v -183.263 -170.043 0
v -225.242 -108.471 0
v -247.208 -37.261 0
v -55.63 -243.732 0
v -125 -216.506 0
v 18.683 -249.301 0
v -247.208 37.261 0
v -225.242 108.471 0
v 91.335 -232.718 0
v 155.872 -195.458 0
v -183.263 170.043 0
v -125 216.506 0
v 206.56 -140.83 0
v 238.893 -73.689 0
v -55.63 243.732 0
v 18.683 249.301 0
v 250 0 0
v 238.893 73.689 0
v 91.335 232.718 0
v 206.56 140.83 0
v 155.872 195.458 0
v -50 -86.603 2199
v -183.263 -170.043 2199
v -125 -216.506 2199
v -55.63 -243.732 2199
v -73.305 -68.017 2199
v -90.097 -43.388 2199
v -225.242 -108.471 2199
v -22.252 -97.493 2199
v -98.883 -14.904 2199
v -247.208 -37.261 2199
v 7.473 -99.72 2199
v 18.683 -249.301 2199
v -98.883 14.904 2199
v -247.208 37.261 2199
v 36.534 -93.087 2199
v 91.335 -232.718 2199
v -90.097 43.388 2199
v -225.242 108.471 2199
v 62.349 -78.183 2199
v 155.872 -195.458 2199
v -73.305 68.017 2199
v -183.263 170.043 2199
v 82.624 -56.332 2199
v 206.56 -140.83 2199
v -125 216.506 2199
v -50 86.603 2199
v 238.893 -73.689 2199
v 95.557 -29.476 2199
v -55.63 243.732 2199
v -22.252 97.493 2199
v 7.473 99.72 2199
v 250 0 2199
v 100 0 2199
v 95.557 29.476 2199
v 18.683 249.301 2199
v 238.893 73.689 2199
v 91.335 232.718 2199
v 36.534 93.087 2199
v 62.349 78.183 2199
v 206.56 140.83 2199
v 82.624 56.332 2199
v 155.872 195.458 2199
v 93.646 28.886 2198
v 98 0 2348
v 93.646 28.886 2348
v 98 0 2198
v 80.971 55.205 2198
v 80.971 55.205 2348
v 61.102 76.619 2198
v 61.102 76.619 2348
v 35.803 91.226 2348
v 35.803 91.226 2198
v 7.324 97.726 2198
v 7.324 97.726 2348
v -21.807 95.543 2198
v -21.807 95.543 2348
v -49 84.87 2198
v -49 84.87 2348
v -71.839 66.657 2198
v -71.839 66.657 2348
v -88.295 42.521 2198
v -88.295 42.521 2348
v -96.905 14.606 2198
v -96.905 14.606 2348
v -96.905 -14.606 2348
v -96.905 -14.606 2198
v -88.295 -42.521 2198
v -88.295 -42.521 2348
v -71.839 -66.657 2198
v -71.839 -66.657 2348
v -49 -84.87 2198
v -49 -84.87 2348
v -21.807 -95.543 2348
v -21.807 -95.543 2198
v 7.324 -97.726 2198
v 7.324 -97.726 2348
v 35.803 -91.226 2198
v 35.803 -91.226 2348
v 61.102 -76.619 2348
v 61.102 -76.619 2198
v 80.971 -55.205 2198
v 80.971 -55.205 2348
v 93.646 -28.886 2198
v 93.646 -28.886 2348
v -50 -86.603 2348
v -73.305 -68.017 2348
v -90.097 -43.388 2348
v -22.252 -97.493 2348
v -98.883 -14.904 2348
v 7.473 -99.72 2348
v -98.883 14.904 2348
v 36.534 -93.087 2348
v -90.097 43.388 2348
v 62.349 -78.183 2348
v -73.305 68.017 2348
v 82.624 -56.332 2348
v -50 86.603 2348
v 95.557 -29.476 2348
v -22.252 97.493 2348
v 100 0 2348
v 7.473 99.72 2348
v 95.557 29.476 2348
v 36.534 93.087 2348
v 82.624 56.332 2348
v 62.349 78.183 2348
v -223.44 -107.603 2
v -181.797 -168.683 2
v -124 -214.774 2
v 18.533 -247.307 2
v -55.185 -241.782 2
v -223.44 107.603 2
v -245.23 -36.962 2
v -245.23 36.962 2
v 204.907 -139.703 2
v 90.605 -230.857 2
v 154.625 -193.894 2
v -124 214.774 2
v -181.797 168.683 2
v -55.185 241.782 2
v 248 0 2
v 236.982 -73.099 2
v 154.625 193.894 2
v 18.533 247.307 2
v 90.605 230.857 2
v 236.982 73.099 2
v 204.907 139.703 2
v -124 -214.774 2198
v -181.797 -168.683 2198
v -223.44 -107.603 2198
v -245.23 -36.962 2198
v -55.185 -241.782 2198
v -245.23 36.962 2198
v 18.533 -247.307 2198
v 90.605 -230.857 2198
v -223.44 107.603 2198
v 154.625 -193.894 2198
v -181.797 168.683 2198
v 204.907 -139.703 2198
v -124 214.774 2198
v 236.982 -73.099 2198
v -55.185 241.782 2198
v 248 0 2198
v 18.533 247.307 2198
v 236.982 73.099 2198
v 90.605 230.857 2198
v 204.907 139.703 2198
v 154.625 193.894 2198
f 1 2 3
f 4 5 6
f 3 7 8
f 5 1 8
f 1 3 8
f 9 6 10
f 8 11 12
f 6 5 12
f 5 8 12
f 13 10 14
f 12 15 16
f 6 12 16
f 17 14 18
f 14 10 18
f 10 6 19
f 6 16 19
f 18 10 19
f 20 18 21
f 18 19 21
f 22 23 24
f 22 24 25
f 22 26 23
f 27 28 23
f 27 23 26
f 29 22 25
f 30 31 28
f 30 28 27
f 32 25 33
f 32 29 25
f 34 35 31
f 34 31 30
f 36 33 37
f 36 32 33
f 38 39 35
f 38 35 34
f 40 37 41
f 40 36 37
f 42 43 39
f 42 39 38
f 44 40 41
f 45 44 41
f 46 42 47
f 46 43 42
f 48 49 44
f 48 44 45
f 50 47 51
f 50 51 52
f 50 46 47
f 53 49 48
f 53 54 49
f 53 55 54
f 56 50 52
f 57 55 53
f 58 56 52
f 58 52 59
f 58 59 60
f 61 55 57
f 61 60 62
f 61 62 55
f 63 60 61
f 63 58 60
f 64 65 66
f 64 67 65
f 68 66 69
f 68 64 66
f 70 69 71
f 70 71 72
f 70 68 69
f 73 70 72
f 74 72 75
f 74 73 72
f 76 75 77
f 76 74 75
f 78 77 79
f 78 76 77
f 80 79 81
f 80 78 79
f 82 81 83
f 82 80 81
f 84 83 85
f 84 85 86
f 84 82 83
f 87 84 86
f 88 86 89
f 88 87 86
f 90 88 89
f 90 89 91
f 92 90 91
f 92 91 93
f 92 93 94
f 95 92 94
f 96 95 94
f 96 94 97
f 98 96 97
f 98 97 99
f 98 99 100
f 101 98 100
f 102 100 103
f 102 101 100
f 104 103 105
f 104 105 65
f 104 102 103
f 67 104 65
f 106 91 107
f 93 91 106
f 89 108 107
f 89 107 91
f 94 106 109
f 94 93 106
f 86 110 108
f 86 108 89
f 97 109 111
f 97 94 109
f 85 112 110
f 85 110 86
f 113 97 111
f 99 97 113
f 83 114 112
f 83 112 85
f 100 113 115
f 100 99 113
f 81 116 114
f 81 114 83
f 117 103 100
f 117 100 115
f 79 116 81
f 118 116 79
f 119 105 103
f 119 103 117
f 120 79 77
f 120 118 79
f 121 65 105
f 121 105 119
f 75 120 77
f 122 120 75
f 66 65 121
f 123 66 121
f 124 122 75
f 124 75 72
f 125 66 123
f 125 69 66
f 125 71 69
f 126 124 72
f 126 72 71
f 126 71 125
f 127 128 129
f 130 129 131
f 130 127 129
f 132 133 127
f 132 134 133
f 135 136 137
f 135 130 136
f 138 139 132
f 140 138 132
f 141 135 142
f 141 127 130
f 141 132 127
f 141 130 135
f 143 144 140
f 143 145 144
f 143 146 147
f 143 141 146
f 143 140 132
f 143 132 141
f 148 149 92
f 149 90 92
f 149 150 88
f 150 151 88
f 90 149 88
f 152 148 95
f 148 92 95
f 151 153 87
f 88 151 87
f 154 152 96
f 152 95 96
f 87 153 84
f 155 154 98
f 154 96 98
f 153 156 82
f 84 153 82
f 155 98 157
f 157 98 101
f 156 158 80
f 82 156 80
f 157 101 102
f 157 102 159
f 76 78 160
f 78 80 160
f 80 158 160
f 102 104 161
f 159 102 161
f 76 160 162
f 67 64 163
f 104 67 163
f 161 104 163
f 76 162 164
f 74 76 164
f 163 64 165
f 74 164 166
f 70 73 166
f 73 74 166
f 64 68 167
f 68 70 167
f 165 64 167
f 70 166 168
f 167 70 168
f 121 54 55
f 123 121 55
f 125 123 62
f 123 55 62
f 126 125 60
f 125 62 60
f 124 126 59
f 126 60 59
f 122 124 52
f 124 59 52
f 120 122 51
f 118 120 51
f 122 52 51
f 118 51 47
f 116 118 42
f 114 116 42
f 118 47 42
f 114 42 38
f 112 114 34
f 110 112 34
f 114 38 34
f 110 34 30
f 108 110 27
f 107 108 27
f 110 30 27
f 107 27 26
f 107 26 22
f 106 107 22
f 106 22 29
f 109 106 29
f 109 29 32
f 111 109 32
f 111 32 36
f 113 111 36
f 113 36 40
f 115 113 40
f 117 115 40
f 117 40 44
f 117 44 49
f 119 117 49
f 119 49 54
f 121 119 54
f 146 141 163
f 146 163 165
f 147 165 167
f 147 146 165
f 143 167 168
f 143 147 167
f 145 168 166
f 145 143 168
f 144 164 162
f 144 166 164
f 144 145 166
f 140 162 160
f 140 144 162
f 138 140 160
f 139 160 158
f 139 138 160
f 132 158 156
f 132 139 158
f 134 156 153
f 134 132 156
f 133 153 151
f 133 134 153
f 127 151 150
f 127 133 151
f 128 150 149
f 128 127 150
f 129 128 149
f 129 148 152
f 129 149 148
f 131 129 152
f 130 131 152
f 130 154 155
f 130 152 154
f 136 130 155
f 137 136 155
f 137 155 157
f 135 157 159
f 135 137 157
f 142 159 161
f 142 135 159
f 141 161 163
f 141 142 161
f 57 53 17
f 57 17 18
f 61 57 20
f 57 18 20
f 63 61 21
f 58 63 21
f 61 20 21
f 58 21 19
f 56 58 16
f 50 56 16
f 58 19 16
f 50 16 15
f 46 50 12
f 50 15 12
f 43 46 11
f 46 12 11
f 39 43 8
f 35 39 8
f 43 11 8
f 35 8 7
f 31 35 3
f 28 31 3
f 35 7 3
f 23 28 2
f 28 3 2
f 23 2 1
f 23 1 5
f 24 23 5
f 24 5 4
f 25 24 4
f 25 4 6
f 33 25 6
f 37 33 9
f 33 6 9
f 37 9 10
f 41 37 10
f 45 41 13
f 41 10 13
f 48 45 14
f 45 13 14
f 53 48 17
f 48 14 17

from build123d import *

# Parameters (mm, degrees)
SKETCH1_R           = 250
BOSS_EXTRUDE1_DEPTH = 2198
SHELL2_T            = -2
SKETCH2_R           = 100
SKETCH2_R_2         = 98
EXTRUDE_THIN1_DEPTH = 150
SKETCH3_R           = 250
SKETCH3_R_2         = 98
BOSS_EXTRUDE2_DEPTH = 1


with BuildPart() as part:
    # Sketch1 → Boss-Extrude1 (new body)
    with BuildSketch(Plane.XY):
        Circle(SKETCH1_R)
    extrude(amount=BOSS_EXTRUDE1_DEPTH)

    # Shell2
    shell2_openings = [part.faces().sort_by_distance(p)[0] for p in [
        (0, 0, 2198),
    ]]
    offset(amount=SHELL2_T, openings=shell2_openings, kind=Kind.INTERSECTION)



with BuildPart() as body_2:
    # Sketch2 → Extrude-Thin1 (new body)
    with BuildSketch(Plane.XY.offset(2198)):
        Circle(SKETCH2_R)
        Circle(SKETCH2_R_2, mode=Mode.SUBTRACT)
    extrude(amount=EXTRUDE_THIN1_DEPTH)


with BuildPart() as part_1:
    add(part.part)

    add(body_2.part)  # Boss-Extrude2 merges body 2
    # Sketch3 → Boss-Extrude2 (add)
    with BuildSketch(Plane.XY.offset(2198)):
        Circle(SKETCH3_R)
        Circle(SKETCH3_R_2, mode=Mode.SUBTRACT)
    extrude(amount=BOSS_EXTRUDE2_DEPTH)


solid = part_1.part
